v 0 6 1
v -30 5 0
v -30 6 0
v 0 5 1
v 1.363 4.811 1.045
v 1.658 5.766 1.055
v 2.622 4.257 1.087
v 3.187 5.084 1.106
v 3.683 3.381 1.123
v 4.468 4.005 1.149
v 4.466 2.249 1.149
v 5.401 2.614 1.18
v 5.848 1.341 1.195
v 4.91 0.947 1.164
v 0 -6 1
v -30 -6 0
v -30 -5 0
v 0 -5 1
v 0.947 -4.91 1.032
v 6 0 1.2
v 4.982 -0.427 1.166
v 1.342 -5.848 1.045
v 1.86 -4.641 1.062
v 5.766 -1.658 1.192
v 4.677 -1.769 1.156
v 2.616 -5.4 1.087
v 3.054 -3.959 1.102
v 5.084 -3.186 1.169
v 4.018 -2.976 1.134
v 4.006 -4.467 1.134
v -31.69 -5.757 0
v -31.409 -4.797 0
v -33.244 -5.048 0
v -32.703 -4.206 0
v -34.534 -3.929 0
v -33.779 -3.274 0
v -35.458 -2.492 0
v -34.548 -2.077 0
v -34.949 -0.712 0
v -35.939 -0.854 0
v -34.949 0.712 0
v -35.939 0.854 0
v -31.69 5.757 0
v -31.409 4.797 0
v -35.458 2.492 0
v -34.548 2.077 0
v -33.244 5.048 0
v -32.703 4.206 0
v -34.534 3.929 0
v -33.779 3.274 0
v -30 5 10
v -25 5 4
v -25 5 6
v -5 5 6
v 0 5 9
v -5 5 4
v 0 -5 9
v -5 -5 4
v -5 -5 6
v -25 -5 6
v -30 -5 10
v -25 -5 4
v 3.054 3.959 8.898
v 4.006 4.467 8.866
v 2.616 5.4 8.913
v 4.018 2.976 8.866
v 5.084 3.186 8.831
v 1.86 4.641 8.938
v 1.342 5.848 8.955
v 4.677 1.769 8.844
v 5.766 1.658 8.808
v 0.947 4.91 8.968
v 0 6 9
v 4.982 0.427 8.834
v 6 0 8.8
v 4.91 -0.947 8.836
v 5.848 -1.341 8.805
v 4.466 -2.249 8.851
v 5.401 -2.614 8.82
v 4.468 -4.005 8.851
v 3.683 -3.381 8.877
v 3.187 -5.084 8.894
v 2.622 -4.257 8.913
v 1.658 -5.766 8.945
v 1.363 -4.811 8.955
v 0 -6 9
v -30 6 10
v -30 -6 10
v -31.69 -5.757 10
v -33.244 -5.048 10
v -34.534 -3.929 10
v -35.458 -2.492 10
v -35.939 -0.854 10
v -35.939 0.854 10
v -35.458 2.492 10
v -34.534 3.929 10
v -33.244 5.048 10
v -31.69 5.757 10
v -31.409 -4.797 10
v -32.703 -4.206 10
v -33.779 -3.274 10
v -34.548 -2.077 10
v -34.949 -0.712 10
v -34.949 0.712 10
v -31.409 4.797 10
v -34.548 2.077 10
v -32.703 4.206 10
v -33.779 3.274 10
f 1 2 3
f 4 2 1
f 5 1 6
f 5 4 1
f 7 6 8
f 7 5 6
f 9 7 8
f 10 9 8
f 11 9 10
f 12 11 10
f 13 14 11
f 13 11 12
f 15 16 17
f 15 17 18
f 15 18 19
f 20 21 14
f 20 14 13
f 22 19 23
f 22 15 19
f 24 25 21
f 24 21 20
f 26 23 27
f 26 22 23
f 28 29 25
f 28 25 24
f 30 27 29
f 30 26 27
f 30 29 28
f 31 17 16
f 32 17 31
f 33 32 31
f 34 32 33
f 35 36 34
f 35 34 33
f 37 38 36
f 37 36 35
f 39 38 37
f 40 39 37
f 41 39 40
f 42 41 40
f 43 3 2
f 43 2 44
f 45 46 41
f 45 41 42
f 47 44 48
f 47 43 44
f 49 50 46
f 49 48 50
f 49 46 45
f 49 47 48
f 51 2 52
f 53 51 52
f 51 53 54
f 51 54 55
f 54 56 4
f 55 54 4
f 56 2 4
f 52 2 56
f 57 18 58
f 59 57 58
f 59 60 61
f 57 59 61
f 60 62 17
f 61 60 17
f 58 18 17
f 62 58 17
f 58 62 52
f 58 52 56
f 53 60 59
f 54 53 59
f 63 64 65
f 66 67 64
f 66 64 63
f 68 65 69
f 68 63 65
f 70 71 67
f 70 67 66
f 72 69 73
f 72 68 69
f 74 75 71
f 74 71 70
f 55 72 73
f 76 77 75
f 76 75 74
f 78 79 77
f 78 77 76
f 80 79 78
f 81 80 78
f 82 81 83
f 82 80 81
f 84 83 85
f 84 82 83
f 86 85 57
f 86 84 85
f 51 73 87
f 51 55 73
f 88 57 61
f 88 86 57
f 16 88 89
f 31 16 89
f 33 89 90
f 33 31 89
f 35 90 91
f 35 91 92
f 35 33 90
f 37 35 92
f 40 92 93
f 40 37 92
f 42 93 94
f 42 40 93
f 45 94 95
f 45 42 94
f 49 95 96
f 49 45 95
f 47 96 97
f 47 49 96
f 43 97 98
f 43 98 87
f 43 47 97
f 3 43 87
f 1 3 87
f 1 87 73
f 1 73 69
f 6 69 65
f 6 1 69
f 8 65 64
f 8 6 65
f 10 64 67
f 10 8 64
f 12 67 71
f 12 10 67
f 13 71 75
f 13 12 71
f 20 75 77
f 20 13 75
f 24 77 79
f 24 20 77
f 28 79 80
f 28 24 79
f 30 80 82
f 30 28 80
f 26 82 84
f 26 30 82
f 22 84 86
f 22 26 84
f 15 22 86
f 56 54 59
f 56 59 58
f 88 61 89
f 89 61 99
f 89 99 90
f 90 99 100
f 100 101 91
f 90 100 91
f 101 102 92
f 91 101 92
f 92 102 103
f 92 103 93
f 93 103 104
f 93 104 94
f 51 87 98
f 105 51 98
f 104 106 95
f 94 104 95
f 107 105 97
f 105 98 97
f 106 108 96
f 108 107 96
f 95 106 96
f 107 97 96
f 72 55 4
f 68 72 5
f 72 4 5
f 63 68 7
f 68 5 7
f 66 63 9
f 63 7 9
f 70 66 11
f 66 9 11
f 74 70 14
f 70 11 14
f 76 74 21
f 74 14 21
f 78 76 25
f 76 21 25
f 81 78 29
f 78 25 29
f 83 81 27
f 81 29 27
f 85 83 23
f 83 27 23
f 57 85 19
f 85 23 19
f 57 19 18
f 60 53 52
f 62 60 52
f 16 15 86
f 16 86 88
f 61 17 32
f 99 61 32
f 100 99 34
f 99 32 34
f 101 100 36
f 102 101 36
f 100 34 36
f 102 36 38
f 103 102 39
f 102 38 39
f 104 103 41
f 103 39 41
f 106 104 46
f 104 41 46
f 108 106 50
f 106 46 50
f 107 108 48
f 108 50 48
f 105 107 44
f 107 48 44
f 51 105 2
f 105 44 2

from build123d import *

# Parameters (mm, degrees)
BOSS_EXTRUDE1_DEPTH = 10
SKETCH2_W           = 20
SKETCH2_H           = 2
BOSS_EXTRUDE2_DEPTH = 10
CUT_EXTRUDE1_START  = -12
CUT_EXTRUDE1_DEPTH  = 12


# Read off the part's stored shape, not the designer's step: Cut-Extrude1
with BuildPart() as part:
    # Sketch1 → Boss-Extrude1 (new body)
    with BuildSketch(Plane.XY):
        with BuildLine():
            Line((0, -6), (-30, -6))
            ThreePointArc((-30, -6), (-36, 0), (-30, 6))
            Line((-30, 6), (0, 6))
            ThreePointArc((0, 6), (6, 0), (0, -6))
        make_face()
        with BuildLine():
            Line((-30, 5), (0, 5))
            ThreePointArc((0, 5), (5, 0), (0, -5))
            Line((0, -5), (-30, -5))
            ThreePointArc((-30, -5), (-35, 0), (-30, 5))
        make_face(mode=Mode.SUBTRACT)
    extrude(amount=BOSS_EXTRUDE1_DEPTH)

    # Sketch2 → Boss-Extrude2 (add)
    with BuildSketch(Plane(origin=(0, -5, 0), x_dir=(1, 0, 0), z_dir=(0, 1, 0))):
        with Locations((-15, -5)):
            Rectangle(SKETCH2_W, SKETCH2_H)
    extrude(amount=BOSS_EXTRUDE2_DEPTH)

    # Cut-Extrude1 outline → Cut-Extrude1 (cut)
    with BuildSketch(Plane(origin=(0, 6, 0), x_dir=(1, 0, 0), z_dir=(0, 1, 0)).offset(CUT_EXTRUDE1_START)):
        Polygon((6, -8.8), (-30, -10), (7, -10), (7, -8.766666667), align=None)
        Polygon((6, -1.2), (7, -1.233333333), (7, 0), (-30, 0), align=None)
    extrude(amount=CUT_EXTRUDE1_DEPTH, mode=Mode.SUBTRACT)


solid = part.part
